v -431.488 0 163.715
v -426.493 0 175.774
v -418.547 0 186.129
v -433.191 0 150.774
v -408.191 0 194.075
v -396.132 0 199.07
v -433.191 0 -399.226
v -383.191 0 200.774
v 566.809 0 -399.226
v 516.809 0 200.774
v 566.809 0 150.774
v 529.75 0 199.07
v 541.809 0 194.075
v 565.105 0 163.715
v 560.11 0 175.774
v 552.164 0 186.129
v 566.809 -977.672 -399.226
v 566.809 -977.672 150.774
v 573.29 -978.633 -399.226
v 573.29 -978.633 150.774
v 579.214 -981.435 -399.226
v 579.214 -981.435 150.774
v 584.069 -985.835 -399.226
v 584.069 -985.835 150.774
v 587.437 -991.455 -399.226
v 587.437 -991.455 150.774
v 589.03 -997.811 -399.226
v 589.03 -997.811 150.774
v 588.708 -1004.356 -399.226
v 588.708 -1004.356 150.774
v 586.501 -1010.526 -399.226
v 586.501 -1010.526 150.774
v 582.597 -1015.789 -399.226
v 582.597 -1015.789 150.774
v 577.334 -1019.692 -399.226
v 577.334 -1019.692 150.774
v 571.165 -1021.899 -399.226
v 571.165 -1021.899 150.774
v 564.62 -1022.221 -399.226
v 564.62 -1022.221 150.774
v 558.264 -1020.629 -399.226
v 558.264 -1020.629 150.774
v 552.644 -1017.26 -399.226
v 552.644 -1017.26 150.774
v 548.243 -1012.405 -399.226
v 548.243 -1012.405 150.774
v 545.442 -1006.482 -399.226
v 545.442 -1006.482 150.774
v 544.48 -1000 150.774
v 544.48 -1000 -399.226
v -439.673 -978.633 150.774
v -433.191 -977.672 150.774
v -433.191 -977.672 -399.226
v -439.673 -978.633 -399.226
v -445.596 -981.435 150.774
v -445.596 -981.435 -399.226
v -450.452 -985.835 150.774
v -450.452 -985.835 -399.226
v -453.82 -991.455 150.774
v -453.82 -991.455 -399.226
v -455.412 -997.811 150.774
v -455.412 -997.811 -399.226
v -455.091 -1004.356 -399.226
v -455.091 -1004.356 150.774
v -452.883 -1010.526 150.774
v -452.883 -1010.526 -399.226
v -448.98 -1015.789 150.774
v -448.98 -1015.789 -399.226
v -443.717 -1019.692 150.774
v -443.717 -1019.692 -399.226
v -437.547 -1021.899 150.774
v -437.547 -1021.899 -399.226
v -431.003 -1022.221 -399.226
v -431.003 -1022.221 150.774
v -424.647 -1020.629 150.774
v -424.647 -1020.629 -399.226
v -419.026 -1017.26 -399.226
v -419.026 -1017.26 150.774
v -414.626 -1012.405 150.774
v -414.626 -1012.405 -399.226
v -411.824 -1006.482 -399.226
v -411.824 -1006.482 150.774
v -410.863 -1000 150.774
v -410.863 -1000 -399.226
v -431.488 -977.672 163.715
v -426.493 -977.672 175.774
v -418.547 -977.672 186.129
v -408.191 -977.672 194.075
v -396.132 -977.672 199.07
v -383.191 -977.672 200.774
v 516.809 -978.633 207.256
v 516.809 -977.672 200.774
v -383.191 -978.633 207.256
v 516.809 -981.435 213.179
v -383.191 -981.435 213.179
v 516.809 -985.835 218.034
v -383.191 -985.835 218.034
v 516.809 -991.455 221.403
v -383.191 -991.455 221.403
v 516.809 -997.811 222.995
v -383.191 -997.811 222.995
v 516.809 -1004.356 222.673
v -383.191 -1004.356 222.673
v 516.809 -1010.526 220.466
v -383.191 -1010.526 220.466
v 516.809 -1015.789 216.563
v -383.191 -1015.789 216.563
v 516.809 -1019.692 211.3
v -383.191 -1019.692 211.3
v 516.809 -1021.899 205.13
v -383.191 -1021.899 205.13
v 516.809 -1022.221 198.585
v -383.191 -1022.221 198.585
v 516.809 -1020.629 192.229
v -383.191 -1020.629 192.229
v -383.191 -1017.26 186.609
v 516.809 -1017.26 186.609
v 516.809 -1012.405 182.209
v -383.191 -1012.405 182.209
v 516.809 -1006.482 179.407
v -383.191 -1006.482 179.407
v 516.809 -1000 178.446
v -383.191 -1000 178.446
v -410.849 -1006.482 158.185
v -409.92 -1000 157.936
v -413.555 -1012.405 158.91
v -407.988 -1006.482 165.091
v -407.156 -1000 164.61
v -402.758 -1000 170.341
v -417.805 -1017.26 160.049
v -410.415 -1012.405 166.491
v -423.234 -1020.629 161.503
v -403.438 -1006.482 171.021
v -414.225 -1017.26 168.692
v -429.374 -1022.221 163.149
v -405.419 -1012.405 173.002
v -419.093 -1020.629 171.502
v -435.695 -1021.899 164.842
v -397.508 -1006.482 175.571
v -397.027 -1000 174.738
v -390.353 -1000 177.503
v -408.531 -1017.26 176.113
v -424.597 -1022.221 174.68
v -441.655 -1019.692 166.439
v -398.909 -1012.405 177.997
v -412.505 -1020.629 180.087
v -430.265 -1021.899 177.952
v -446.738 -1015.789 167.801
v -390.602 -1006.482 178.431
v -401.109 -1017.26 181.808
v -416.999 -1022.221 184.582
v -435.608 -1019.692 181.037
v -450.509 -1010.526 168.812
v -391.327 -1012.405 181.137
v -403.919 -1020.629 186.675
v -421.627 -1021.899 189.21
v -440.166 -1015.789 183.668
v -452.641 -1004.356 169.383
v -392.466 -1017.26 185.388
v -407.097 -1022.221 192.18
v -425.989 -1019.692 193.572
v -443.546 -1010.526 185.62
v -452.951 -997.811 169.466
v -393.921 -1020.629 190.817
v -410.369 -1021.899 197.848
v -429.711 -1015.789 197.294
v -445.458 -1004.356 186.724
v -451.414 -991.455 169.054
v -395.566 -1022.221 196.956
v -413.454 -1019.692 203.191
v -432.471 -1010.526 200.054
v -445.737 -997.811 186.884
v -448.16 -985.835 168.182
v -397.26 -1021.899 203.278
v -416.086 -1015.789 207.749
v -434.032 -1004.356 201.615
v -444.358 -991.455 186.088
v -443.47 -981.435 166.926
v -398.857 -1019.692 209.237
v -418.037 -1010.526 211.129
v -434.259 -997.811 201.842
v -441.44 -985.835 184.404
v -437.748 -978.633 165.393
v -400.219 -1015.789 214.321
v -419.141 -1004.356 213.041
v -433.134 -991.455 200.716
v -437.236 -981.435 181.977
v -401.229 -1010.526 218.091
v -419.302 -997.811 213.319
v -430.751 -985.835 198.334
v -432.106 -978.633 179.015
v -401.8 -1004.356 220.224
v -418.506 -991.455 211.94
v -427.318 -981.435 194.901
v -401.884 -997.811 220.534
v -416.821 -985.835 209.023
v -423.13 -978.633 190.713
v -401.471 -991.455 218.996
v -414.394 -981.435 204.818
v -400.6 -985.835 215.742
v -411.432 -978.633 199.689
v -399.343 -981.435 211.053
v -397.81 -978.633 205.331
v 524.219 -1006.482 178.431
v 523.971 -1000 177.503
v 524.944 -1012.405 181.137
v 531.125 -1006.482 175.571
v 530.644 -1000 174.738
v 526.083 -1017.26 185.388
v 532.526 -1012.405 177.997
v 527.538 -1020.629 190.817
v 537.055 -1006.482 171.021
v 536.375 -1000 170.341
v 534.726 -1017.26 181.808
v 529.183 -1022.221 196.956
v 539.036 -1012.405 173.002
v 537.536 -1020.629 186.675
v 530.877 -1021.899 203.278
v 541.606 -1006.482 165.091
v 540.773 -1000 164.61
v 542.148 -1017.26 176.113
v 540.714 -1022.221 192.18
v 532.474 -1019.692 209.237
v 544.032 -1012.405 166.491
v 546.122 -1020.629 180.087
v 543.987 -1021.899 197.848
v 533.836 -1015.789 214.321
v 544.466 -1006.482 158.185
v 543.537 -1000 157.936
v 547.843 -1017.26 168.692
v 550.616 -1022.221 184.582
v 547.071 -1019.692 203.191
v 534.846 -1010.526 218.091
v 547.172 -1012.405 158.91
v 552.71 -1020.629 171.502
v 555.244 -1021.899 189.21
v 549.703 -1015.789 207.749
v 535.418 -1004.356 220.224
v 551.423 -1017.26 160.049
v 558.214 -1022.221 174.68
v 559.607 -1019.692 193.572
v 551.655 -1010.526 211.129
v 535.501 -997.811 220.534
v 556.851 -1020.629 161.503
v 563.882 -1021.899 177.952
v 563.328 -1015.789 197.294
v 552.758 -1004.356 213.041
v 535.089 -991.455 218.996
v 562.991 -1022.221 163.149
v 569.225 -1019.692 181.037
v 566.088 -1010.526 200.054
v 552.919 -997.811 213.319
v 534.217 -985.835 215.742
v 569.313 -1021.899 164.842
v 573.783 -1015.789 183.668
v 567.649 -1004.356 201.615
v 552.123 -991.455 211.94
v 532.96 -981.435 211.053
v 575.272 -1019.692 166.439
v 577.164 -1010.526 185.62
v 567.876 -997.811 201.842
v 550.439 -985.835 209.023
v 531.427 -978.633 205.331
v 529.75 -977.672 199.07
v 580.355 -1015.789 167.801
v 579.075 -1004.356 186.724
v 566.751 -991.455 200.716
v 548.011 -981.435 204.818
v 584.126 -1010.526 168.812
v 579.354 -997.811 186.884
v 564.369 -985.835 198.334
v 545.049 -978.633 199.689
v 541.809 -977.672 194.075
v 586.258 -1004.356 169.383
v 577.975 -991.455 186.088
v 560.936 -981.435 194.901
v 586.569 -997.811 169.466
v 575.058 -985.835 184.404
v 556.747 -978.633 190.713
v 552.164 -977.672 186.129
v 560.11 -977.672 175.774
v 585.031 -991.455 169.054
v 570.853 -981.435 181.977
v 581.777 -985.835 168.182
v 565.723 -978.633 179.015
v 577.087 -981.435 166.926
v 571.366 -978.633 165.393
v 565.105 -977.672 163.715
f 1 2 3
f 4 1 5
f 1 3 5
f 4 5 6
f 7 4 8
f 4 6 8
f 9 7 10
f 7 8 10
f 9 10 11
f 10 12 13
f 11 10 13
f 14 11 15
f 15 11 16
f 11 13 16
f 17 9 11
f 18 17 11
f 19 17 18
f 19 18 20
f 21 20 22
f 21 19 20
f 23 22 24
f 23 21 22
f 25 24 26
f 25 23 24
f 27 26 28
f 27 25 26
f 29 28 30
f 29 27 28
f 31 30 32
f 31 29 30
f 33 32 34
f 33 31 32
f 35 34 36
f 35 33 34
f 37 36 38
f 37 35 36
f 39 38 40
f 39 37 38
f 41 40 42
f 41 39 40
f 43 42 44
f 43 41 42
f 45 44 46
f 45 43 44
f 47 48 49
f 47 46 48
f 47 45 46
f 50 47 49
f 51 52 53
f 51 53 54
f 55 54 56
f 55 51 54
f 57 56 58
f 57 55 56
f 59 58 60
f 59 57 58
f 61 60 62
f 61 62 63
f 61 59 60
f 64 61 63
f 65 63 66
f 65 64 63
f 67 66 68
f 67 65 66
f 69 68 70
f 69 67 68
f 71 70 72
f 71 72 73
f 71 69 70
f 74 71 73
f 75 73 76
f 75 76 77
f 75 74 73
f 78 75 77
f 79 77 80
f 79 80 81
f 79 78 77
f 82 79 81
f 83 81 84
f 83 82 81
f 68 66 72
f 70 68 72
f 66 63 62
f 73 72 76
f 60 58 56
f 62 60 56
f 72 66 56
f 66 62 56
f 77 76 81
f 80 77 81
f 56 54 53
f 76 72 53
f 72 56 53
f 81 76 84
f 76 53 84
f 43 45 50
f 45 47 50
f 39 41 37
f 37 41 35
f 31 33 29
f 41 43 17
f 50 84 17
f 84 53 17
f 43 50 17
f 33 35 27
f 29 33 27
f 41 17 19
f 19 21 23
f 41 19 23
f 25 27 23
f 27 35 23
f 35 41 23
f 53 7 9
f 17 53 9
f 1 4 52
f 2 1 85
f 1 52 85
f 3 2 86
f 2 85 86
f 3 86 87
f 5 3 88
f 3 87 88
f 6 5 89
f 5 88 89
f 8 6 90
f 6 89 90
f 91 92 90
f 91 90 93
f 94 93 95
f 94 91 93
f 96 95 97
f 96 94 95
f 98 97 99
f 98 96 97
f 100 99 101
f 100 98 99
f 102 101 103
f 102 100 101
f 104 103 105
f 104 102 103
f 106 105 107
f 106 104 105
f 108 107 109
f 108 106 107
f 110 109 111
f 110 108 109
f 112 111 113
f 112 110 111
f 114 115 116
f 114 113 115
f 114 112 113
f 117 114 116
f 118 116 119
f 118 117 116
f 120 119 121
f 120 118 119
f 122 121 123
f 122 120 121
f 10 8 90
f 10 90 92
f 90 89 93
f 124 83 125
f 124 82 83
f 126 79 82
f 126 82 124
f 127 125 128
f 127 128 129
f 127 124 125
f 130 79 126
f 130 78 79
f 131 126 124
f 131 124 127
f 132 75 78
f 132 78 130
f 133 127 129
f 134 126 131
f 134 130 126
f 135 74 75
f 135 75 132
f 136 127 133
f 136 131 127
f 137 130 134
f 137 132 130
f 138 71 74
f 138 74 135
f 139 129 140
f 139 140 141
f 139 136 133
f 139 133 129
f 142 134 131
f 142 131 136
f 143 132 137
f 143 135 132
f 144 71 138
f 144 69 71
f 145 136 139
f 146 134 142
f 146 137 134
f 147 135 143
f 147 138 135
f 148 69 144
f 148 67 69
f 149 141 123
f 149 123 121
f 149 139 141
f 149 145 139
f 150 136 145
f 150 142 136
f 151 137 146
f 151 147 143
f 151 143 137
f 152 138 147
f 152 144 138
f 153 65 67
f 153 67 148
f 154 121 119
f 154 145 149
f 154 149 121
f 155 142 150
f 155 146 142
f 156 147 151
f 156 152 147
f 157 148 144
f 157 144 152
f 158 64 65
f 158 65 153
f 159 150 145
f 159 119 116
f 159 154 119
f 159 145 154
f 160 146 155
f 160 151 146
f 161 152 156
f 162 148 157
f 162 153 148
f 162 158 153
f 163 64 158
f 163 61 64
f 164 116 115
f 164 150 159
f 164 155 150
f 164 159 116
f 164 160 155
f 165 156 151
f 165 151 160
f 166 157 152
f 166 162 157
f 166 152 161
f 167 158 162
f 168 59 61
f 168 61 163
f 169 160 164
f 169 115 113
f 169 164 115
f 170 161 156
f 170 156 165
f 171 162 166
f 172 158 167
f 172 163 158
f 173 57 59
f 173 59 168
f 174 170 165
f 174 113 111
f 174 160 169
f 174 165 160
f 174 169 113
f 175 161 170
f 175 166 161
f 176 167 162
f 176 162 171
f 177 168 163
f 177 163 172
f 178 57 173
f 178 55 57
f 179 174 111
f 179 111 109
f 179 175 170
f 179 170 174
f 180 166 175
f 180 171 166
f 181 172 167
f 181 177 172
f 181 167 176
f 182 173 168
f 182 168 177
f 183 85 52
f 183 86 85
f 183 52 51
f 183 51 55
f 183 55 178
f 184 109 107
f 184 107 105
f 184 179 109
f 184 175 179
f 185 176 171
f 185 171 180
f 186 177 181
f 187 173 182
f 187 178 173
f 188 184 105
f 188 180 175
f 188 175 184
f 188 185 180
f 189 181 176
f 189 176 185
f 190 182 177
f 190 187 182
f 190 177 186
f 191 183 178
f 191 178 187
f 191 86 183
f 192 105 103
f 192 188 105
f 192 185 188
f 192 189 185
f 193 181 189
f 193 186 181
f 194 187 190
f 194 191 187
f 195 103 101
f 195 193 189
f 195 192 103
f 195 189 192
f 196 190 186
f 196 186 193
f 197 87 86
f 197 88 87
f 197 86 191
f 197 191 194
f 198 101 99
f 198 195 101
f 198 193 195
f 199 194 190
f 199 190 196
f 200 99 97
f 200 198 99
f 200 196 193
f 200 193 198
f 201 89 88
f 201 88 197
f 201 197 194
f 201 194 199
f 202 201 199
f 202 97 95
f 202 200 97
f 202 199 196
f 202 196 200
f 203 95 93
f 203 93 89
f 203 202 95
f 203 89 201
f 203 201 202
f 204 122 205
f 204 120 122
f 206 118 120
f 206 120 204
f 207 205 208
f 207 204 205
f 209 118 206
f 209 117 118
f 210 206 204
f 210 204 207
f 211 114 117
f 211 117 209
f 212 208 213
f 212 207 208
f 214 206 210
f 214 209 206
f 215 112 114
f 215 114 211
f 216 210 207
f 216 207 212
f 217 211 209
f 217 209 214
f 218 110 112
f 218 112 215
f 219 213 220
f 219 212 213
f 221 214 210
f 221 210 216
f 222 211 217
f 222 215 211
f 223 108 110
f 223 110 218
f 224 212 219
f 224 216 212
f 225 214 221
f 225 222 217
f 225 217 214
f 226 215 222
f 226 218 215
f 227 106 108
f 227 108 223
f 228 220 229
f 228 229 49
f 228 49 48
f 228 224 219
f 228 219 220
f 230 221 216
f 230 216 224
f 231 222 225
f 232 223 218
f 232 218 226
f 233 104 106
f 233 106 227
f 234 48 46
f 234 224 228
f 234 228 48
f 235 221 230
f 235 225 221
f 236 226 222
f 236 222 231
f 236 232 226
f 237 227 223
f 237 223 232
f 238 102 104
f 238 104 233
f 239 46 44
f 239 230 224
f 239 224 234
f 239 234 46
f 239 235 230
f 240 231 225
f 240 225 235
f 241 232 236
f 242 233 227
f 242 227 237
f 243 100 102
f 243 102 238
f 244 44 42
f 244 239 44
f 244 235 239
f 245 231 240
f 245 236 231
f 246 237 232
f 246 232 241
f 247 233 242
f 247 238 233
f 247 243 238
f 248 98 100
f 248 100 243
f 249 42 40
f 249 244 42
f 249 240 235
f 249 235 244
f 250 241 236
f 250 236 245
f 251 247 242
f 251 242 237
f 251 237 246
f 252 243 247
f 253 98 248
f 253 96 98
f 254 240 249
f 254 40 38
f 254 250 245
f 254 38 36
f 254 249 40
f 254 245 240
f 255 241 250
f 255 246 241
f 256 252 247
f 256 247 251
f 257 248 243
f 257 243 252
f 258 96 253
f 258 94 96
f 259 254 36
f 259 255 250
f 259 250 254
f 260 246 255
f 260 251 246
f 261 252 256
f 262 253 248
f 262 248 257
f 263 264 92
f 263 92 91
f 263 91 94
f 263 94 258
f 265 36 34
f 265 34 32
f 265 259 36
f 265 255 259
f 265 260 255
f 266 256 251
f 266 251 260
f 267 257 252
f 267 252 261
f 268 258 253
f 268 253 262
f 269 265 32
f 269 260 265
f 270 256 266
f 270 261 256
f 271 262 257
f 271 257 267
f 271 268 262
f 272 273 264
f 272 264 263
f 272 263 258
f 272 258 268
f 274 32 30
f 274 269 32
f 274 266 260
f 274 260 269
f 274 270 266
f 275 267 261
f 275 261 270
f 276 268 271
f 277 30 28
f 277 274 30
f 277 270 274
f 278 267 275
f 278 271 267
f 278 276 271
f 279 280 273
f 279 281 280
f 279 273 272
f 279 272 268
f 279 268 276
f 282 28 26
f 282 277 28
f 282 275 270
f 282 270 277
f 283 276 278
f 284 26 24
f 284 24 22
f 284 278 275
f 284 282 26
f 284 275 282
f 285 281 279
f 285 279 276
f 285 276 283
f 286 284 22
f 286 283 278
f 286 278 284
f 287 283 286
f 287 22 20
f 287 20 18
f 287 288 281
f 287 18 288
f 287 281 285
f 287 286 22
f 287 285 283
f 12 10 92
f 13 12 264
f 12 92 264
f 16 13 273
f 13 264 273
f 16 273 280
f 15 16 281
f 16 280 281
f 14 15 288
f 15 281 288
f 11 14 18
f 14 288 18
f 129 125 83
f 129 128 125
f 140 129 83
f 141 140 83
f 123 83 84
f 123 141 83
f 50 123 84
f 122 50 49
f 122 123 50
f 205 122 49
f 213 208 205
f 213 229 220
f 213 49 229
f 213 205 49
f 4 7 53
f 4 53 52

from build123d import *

# Parameters (mm, degrees)
F0_W     = 1000
F0_H     = 600
F1_DEPTH = 1000
F2_R     = 50
F3_R     = 50


with BuildPart() as f1:
    # F0 (on Front) → F1 (new body)
    with BuildSketch(Plane.XZ):
        with Locations((66.8085864745, -99.2259835054)):
            Rectangle(F0_W, F0_H)
    extrude(amount=F1_DEPTH)

    # F2
    f2_edges = [f1.edges().sort_by_distance(p)[0] for p in [
        (-433.191414, -500, 200.774016),
    ]]
    fillet(f2_edges, radius=F2_R)

    # F3
    f3_edges = [f1.edges().sort_by_distance(p)[0] for p in [
        (566.808586, -500, 200.774016),
    ]]
    fillet(f3_edges, radius=F3_R)

    # F5: sweep along a path in F5_path
    with BuildLine(Plane(origin=(-433.1914135255, -1000, -399.2259835054), x_dir=(0, 0, 1), z_dir=(0, -1, 0))) as f5_path:
        Line((0, 0), (550, 0))
        ThreePointArc((550, 0), (585.3553390593, -14.6446609407), (600, -50))
        Line((600, -50), (600, -950))
        ThreePointArc((600, -950), (585.3553390593, -985.3553390593), (550, -1000))
        Line((550, -1000), (0, -1000))
    # F4 (on face) → F5 (sweep)
    with BuildSketch(Plane(origin=(0, 0, -399.2259835054), x_dir=(1, 0, 0), z_dir=(0, 0, -1))):
        with BuildLine():
            ThreePointArc((-433.1914135255, 977.6715629095), (-417.4028242455, 984.21141072), (-410.862976435, 1000))
            Line((-410.862976435, 1000), (-433.1914135255, 1000))
            Line((-433.1914135255, 1000), (-433.1914135255, 977.6715629095))
        make_face()
        with BuildLine():
            Line((-433.1914135255, 1000), (-410.862976435, 1000))
            ThreePointArc((-410.862976435, 1000), (-448.9800028055, 1015.78858928), (-433.1914135255, 977.6715629095))
            Line((-433.1914135255, 977.6715629095), (-433.1914135255, 1000))
        make_face()
    sweep(path=f5_path.line)


solid = f1.part
